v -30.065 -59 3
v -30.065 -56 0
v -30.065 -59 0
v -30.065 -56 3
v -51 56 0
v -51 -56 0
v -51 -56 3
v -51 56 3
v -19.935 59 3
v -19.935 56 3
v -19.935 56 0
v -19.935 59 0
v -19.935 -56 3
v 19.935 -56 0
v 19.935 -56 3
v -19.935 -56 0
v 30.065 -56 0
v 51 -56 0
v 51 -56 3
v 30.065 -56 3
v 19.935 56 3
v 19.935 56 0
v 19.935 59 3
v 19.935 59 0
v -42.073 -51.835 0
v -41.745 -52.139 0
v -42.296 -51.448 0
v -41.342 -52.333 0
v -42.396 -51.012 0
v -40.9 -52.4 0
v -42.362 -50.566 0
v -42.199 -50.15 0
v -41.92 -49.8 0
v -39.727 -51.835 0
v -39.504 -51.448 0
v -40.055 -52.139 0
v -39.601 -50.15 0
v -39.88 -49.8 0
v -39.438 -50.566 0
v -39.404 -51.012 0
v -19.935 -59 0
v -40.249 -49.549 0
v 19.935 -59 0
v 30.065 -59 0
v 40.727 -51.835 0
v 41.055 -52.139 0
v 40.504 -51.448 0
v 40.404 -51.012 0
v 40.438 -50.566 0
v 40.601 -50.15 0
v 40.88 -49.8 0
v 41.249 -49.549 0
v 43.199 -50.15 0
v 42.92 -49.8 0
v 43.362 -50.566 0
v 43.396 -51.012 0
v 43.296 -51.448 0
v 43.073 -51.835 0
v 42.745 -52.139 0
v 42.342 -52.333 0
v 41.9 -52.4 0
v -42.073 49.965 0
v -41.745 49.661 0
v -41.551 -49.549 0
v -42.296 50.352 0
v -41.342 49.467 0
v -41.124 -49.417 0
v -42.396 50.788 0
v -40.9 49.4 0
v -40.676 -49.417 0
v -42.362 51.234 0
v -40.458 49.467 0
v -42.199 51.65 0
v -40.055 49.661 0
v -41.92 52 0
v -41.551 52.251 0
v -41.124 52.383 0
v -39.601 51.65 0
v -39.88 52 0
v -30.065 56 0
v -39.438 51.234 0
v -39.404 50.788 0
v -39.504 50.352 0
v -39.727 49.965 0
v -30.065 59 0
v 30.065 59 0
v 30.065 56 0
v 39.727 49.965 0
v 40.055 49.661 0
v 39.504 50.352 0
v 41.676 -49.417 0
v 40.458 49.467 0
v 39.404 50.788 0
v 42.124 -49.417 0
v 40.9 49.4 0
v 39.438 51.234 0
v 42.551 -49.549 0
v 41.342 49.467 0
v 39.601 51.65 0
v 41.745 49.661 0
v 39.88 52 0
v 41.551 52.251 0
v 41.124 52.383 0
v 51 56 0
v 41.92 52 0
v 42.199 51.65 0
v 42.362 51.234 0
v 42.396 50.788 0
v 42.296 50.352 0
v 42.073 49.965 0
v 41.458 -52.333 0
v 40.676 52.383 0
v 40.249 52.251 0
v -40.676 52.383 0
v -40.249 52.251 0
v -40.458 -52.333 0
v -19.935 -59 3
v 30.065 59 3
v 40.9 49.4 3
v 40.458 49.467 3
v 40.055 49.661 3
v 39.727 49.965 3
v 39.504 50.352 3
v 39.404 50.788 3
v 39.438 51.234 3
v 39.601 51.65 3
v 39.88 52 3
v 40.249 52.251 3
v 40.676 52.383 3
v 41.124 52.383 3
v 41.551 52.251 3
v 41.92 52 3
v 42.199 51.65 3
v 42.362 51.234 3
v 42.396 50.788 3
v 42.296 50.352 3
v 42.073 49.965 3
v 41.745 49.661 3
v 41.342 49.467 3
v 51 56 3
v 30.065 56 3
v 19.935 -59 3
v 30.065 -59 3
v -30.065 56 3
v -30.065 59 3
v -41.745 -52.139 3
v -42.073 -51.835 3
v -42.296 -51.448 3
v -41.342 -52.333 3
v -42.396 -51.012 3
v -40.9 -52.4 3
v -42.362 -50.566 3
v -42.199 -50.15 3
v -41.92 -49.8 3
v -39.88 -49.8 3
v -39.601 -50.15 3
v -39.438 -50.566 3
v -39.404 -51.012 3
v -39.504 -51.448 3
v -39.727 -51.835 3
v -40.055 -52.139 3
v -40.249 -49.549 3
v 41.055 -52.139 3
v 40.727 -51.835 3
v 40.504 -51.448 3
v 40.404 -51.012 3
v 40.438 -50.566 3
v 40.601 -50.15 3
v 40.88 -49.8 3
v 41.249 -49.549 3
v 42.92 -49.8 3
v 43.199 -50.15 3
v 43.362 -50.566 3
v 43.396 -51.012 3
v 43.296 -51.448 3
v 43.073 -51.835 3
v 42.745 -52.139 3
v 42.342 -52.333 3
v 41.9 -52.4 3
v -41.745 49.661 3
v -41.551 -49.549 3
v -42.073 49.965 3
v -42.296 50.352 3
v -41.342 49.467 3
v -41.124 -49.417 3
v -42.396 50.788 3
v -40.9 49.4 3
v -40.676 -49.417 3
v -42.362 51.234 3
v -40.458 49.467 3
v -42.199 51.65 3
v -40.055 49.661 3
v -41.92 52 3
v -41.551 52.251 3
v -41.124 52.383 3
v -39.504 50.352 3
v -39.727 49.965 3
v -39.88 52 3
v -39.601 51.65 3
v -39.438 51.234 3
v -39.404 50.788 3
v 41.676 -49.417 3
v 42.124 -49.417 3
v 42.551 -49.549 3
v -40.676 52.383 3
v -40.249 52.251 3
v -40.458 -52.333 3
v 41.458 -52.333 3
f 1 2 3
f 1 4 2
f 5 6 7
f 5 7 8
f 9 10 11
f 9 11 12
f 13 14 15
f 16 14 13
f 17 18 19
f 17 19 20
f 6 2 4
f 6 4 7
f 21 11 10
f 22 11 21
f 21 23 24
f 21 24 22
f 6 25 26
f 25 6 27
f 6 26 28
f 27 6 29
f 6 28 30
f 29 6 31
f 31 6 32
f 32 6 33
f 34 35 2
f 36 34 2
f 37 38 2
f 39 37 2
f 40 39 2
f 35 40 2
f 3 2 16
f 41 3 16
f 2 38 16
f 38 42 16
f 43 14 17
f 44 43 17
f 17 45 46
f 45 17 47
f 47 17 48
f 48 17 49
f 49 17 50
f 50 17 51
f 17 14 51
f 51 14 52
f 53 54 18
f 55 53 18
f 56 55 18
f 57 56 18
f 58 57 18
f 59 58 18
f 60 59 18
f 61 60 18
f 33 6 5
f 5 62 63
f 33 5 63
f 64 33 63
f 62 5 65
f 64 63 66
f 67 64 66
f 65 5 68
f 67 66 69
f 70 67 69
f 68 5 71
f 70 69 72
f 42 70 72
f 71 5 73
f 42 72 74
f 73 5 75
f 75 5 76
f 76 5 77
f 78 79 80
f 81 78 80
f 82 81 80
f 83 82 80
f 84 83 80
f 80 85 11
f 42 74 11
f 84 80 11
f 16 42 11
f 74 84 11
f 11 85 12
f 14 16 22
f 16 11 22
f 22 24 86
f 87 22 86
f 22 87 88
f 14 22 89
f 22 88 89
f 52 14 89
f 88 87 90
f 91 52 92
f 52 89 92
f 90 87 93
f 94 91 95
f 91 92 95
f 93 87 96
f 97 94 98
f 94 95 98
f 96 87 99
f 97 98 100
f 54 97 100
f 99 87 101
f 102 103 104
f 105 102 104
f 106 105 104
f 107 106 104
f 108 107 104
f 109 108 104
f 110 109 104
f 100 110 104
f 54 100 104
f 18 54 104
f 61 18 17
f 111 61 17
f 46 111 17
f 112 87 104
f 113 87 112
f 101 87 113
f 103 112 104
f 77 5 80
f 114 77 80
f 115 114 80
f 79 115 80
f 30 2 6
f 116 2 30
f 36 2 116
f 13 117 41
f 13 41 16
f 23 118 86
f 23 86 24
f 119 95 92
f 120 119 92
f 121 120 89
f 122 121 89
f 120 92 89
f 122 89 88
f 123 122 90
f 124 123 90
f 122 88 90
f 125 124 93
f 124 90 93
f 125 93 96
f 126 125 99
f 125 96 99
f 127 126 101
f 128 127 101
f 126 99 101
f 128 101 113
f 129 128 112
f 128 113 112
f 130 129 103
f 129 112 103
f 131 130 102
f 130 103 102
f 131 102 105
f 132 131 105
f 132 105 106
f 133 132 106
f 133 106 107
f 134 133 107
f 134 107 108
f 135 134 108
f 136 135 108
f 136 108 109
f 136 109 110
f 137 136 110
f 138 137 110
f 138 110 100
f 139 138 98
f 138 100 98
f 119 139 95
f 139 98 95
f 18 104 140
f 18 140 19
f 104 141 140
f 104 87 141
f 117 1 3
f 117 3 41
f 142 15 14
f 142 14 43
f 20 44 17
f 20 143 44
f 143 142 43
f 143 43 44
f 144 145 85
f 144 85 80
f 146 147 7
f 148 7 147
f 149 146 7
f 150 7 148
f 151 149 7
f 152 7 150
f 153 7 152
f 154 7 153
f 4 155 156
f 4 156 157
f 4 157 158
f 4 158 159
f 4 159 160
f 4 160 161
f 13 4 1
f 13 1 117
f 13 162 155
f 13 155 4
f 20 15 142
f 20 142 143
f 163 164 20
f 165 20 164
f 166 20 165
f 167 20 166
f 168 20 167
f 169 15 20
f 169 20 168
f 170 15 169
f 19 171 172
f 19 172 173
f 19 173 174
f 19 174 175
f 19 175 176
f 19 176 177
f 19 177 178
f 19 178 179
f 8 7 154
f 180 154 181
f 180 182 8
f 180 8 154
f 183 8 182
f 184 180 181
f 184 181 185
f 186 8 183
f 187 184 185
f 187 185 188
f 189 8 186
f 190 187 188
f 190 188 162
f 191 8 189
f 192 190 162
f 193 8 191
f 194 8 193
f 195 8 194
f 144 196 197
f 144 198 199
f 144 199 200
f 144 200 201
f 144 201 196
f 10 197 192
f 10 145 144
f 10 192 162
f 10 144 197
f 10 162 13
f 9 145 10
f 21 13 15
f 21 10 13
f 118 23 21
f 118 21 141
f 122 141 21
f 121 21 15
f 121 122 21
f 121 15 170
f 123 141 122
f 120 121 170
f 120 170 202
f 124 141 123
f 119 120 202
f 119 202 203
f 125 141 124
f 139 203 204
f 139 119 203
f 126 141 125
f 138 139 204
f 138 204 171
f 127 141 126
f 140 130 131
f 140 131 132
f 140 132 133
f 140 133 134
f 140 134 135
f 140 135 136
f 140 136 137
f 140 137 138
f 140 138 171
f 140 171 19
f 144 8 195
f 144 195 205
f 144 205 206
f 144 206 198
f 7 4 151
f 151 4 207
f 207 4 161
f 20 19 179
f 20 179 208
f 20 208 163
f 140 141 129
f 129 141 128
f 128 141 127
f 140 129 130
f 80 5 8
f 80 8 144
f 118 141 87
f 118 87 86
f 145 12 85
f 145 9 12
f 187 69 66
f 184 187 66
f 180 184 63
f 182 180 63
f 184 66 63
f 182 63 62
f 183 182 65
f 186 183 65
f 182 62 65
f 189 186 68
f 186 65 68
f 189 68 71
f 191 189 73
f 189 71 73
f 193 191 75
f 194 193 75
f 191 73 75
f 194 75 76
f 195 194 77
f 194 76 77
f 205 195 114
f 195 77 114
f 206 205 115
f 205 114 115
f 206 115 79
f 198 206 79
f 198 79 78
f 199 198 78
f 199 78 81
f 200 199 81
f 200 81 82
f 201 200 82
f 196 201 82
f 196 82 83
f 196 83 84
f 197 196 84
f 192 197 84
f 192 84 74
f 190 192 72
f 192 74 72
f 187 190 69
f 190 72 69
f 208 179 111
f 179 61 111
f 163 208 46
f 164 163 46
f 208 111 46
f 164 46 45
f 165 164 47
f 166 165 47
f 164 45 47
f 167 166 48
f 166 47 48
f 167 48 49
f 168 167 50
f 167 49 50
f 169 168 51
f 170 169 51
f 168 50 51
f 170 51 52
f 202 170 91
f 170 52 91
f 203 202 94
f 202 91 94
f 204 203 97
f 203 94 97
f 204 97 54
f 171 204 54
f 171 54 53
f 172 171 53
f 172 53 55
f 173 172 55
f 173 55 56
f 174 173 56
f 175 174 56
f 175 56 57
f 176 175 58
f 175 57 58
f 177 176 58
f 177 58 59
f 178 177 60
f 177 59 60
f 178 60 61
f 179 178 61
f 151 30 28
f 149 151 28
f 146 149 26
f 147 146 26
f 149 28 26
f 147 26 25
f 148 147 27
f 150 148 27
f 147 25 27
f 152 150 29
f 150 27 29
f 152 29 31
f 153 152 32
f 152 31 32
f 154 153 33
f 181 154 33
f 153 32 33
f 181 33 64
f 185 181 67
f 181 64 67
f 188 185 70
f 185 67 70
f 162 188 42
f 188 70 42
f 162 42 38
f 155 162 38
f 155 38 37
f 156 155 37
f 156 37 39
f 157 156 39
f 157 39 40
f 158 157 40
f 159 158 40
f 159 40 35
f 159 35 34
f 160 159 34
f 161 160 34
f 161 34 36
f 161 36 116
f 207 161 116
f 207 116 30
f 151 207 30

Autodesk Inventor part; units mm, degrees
ref_plane "YZ Plane" through (0, 0, 0) normal (1, 0, 0) x (0, 1, 0)
ref_plane "XZ Plane" through (0, 0, 0) normal (0, 1, 0) x (-1, 0, 0)
sketch "Sketch1" plane through (0, 0, 0) normal (0, 0, 1) x (1, 0, 0)
  line L0 (-51, 56) -> (51, 56)
  line L1 (51, 56) -> (51, -56)
  line L2 (51, -56) -> (-51, -56)
  line L3 (-51, -56) -> (-51, 56)
  line L4 (-51, 56) -> (51, -56) construction
  line L5 (51, 56) -> (-51, -56) construction
  point P0 (0, 0)
  point P1 (0, 0)
  point P2 (0, 0)
  dimension "d0" = 102
  dimension "d1" = 112
extrude "Extrusion1" add sketch "Sketch1" along normal blind 3
sketch "Sketch2" plane through (0, 0, 3) normal (0, 0, 1) x (1, 0, 0)
  line L0 (-51, -56) -> (51, -56) projected
  line L1 (-30.065, -59) -> (-19.935, -59)
  line L2 (-19.935, -59) -> (-19.935, -56)
  line L3 (-19.935, -56) -> (-30.065, -56)
  line L4 (-30.065, -56) -> (-30.065, -59)
  line L5 (-30.065, -59) -> (-19.935, -56) construction
  line L6 (-19.935, -59) -> (-30.065, -56) construction
  line L7 (19.935, -59) -> (30.065, -59)
  line L8 (30.065, -59) -> (30.065, -56)
  line L9 (30.065, -56) -> (19.935, -56)
  line L10 (19.935, -56) -> (19.935, -59)
  line L11 (19.935, -59) -> (30.065, -56) construction
  line L12 (30.065, -59) -> (19.935, -56) construction
  point P0 (0, 0)
  point P1 (-25, -57.5)
  point P2 (25, -57.5)
  dimension "d4" = 3
  dimension "d5" = 25
  dimension "d6" = 25
  dimension "d7" = 10.13
  dimension "d8" = 10.13
extrude "Extrusion2" add sketch "Sketch2" against normal blind 3
mirror "Mirror1" about plane through (0, 0, 0) normal (0, 1, 0) of "Extrusion2"
sketch "Sketch3" plane through (0, 0, 0) normal (0, 0, -1) x (-1, 0, 0)
  line L0 (-51, -56) -> (-51, 56) construction
  line L1 (-51, 55) -> (51, 55) construction
  line L2 (51, 56) -> (51, -56) construction
  line L3 (-51, -55) -> (51, -55) construction
  line L4 (-19.935, -56) -> (19.935, -56) construction
  line L5 (-30.065, 56) -> (-51, 56) construction
  point P0 (0, 0)
  dimension "d11" = 1
  dimension "d12" = 1
ref_plane "Work Plane1" through (-19.935, -55, 0) normal (0, -1, 0) x (1, 0, 0)
sketch "Sketch4" plane through (0, 0, 3) normal (0, 0, 1) x (1, 0, 0)
  line L0 (-51, 56) -> (-51, -56) projected
  line L1 (-51, -56) -> (-30.065, -56) projected
  line L2 (-30.065, 56) -> (-51, 56) projected
  line L3 (51, -56) -> (51, 56) projected
  point P0 (0, 0)
  point P1 (-40.9, -50.9)
  point P2 (-40.9, 50.9)
  point P3 (41.9, -50.9)
  point P4 (40.9, 50.9)
  dimension "d14" = 10.1
  dimension "d15" = 5.1
  dimension "d16" = 5.1
  dimension "d17" = 9.1
  dimension "d32" = 10.1
hole "Hole2" at (-40.9, -50.9, 3) at (41.9, -50.9, 3) at (40.9, 50.9, 3) at (-40.9, 50.9, 3) direction (0, 0, -1) diameter 3 end through all
equation "\"d6\" = d5"
equation "\"d8\" = d7"
equation "\"d12\" = d11"
equation "\"d16\" = d15"
equation "\"kerf\" = 0.13"
properties part number "BottomPlate" material "Acrylic, Clear"
